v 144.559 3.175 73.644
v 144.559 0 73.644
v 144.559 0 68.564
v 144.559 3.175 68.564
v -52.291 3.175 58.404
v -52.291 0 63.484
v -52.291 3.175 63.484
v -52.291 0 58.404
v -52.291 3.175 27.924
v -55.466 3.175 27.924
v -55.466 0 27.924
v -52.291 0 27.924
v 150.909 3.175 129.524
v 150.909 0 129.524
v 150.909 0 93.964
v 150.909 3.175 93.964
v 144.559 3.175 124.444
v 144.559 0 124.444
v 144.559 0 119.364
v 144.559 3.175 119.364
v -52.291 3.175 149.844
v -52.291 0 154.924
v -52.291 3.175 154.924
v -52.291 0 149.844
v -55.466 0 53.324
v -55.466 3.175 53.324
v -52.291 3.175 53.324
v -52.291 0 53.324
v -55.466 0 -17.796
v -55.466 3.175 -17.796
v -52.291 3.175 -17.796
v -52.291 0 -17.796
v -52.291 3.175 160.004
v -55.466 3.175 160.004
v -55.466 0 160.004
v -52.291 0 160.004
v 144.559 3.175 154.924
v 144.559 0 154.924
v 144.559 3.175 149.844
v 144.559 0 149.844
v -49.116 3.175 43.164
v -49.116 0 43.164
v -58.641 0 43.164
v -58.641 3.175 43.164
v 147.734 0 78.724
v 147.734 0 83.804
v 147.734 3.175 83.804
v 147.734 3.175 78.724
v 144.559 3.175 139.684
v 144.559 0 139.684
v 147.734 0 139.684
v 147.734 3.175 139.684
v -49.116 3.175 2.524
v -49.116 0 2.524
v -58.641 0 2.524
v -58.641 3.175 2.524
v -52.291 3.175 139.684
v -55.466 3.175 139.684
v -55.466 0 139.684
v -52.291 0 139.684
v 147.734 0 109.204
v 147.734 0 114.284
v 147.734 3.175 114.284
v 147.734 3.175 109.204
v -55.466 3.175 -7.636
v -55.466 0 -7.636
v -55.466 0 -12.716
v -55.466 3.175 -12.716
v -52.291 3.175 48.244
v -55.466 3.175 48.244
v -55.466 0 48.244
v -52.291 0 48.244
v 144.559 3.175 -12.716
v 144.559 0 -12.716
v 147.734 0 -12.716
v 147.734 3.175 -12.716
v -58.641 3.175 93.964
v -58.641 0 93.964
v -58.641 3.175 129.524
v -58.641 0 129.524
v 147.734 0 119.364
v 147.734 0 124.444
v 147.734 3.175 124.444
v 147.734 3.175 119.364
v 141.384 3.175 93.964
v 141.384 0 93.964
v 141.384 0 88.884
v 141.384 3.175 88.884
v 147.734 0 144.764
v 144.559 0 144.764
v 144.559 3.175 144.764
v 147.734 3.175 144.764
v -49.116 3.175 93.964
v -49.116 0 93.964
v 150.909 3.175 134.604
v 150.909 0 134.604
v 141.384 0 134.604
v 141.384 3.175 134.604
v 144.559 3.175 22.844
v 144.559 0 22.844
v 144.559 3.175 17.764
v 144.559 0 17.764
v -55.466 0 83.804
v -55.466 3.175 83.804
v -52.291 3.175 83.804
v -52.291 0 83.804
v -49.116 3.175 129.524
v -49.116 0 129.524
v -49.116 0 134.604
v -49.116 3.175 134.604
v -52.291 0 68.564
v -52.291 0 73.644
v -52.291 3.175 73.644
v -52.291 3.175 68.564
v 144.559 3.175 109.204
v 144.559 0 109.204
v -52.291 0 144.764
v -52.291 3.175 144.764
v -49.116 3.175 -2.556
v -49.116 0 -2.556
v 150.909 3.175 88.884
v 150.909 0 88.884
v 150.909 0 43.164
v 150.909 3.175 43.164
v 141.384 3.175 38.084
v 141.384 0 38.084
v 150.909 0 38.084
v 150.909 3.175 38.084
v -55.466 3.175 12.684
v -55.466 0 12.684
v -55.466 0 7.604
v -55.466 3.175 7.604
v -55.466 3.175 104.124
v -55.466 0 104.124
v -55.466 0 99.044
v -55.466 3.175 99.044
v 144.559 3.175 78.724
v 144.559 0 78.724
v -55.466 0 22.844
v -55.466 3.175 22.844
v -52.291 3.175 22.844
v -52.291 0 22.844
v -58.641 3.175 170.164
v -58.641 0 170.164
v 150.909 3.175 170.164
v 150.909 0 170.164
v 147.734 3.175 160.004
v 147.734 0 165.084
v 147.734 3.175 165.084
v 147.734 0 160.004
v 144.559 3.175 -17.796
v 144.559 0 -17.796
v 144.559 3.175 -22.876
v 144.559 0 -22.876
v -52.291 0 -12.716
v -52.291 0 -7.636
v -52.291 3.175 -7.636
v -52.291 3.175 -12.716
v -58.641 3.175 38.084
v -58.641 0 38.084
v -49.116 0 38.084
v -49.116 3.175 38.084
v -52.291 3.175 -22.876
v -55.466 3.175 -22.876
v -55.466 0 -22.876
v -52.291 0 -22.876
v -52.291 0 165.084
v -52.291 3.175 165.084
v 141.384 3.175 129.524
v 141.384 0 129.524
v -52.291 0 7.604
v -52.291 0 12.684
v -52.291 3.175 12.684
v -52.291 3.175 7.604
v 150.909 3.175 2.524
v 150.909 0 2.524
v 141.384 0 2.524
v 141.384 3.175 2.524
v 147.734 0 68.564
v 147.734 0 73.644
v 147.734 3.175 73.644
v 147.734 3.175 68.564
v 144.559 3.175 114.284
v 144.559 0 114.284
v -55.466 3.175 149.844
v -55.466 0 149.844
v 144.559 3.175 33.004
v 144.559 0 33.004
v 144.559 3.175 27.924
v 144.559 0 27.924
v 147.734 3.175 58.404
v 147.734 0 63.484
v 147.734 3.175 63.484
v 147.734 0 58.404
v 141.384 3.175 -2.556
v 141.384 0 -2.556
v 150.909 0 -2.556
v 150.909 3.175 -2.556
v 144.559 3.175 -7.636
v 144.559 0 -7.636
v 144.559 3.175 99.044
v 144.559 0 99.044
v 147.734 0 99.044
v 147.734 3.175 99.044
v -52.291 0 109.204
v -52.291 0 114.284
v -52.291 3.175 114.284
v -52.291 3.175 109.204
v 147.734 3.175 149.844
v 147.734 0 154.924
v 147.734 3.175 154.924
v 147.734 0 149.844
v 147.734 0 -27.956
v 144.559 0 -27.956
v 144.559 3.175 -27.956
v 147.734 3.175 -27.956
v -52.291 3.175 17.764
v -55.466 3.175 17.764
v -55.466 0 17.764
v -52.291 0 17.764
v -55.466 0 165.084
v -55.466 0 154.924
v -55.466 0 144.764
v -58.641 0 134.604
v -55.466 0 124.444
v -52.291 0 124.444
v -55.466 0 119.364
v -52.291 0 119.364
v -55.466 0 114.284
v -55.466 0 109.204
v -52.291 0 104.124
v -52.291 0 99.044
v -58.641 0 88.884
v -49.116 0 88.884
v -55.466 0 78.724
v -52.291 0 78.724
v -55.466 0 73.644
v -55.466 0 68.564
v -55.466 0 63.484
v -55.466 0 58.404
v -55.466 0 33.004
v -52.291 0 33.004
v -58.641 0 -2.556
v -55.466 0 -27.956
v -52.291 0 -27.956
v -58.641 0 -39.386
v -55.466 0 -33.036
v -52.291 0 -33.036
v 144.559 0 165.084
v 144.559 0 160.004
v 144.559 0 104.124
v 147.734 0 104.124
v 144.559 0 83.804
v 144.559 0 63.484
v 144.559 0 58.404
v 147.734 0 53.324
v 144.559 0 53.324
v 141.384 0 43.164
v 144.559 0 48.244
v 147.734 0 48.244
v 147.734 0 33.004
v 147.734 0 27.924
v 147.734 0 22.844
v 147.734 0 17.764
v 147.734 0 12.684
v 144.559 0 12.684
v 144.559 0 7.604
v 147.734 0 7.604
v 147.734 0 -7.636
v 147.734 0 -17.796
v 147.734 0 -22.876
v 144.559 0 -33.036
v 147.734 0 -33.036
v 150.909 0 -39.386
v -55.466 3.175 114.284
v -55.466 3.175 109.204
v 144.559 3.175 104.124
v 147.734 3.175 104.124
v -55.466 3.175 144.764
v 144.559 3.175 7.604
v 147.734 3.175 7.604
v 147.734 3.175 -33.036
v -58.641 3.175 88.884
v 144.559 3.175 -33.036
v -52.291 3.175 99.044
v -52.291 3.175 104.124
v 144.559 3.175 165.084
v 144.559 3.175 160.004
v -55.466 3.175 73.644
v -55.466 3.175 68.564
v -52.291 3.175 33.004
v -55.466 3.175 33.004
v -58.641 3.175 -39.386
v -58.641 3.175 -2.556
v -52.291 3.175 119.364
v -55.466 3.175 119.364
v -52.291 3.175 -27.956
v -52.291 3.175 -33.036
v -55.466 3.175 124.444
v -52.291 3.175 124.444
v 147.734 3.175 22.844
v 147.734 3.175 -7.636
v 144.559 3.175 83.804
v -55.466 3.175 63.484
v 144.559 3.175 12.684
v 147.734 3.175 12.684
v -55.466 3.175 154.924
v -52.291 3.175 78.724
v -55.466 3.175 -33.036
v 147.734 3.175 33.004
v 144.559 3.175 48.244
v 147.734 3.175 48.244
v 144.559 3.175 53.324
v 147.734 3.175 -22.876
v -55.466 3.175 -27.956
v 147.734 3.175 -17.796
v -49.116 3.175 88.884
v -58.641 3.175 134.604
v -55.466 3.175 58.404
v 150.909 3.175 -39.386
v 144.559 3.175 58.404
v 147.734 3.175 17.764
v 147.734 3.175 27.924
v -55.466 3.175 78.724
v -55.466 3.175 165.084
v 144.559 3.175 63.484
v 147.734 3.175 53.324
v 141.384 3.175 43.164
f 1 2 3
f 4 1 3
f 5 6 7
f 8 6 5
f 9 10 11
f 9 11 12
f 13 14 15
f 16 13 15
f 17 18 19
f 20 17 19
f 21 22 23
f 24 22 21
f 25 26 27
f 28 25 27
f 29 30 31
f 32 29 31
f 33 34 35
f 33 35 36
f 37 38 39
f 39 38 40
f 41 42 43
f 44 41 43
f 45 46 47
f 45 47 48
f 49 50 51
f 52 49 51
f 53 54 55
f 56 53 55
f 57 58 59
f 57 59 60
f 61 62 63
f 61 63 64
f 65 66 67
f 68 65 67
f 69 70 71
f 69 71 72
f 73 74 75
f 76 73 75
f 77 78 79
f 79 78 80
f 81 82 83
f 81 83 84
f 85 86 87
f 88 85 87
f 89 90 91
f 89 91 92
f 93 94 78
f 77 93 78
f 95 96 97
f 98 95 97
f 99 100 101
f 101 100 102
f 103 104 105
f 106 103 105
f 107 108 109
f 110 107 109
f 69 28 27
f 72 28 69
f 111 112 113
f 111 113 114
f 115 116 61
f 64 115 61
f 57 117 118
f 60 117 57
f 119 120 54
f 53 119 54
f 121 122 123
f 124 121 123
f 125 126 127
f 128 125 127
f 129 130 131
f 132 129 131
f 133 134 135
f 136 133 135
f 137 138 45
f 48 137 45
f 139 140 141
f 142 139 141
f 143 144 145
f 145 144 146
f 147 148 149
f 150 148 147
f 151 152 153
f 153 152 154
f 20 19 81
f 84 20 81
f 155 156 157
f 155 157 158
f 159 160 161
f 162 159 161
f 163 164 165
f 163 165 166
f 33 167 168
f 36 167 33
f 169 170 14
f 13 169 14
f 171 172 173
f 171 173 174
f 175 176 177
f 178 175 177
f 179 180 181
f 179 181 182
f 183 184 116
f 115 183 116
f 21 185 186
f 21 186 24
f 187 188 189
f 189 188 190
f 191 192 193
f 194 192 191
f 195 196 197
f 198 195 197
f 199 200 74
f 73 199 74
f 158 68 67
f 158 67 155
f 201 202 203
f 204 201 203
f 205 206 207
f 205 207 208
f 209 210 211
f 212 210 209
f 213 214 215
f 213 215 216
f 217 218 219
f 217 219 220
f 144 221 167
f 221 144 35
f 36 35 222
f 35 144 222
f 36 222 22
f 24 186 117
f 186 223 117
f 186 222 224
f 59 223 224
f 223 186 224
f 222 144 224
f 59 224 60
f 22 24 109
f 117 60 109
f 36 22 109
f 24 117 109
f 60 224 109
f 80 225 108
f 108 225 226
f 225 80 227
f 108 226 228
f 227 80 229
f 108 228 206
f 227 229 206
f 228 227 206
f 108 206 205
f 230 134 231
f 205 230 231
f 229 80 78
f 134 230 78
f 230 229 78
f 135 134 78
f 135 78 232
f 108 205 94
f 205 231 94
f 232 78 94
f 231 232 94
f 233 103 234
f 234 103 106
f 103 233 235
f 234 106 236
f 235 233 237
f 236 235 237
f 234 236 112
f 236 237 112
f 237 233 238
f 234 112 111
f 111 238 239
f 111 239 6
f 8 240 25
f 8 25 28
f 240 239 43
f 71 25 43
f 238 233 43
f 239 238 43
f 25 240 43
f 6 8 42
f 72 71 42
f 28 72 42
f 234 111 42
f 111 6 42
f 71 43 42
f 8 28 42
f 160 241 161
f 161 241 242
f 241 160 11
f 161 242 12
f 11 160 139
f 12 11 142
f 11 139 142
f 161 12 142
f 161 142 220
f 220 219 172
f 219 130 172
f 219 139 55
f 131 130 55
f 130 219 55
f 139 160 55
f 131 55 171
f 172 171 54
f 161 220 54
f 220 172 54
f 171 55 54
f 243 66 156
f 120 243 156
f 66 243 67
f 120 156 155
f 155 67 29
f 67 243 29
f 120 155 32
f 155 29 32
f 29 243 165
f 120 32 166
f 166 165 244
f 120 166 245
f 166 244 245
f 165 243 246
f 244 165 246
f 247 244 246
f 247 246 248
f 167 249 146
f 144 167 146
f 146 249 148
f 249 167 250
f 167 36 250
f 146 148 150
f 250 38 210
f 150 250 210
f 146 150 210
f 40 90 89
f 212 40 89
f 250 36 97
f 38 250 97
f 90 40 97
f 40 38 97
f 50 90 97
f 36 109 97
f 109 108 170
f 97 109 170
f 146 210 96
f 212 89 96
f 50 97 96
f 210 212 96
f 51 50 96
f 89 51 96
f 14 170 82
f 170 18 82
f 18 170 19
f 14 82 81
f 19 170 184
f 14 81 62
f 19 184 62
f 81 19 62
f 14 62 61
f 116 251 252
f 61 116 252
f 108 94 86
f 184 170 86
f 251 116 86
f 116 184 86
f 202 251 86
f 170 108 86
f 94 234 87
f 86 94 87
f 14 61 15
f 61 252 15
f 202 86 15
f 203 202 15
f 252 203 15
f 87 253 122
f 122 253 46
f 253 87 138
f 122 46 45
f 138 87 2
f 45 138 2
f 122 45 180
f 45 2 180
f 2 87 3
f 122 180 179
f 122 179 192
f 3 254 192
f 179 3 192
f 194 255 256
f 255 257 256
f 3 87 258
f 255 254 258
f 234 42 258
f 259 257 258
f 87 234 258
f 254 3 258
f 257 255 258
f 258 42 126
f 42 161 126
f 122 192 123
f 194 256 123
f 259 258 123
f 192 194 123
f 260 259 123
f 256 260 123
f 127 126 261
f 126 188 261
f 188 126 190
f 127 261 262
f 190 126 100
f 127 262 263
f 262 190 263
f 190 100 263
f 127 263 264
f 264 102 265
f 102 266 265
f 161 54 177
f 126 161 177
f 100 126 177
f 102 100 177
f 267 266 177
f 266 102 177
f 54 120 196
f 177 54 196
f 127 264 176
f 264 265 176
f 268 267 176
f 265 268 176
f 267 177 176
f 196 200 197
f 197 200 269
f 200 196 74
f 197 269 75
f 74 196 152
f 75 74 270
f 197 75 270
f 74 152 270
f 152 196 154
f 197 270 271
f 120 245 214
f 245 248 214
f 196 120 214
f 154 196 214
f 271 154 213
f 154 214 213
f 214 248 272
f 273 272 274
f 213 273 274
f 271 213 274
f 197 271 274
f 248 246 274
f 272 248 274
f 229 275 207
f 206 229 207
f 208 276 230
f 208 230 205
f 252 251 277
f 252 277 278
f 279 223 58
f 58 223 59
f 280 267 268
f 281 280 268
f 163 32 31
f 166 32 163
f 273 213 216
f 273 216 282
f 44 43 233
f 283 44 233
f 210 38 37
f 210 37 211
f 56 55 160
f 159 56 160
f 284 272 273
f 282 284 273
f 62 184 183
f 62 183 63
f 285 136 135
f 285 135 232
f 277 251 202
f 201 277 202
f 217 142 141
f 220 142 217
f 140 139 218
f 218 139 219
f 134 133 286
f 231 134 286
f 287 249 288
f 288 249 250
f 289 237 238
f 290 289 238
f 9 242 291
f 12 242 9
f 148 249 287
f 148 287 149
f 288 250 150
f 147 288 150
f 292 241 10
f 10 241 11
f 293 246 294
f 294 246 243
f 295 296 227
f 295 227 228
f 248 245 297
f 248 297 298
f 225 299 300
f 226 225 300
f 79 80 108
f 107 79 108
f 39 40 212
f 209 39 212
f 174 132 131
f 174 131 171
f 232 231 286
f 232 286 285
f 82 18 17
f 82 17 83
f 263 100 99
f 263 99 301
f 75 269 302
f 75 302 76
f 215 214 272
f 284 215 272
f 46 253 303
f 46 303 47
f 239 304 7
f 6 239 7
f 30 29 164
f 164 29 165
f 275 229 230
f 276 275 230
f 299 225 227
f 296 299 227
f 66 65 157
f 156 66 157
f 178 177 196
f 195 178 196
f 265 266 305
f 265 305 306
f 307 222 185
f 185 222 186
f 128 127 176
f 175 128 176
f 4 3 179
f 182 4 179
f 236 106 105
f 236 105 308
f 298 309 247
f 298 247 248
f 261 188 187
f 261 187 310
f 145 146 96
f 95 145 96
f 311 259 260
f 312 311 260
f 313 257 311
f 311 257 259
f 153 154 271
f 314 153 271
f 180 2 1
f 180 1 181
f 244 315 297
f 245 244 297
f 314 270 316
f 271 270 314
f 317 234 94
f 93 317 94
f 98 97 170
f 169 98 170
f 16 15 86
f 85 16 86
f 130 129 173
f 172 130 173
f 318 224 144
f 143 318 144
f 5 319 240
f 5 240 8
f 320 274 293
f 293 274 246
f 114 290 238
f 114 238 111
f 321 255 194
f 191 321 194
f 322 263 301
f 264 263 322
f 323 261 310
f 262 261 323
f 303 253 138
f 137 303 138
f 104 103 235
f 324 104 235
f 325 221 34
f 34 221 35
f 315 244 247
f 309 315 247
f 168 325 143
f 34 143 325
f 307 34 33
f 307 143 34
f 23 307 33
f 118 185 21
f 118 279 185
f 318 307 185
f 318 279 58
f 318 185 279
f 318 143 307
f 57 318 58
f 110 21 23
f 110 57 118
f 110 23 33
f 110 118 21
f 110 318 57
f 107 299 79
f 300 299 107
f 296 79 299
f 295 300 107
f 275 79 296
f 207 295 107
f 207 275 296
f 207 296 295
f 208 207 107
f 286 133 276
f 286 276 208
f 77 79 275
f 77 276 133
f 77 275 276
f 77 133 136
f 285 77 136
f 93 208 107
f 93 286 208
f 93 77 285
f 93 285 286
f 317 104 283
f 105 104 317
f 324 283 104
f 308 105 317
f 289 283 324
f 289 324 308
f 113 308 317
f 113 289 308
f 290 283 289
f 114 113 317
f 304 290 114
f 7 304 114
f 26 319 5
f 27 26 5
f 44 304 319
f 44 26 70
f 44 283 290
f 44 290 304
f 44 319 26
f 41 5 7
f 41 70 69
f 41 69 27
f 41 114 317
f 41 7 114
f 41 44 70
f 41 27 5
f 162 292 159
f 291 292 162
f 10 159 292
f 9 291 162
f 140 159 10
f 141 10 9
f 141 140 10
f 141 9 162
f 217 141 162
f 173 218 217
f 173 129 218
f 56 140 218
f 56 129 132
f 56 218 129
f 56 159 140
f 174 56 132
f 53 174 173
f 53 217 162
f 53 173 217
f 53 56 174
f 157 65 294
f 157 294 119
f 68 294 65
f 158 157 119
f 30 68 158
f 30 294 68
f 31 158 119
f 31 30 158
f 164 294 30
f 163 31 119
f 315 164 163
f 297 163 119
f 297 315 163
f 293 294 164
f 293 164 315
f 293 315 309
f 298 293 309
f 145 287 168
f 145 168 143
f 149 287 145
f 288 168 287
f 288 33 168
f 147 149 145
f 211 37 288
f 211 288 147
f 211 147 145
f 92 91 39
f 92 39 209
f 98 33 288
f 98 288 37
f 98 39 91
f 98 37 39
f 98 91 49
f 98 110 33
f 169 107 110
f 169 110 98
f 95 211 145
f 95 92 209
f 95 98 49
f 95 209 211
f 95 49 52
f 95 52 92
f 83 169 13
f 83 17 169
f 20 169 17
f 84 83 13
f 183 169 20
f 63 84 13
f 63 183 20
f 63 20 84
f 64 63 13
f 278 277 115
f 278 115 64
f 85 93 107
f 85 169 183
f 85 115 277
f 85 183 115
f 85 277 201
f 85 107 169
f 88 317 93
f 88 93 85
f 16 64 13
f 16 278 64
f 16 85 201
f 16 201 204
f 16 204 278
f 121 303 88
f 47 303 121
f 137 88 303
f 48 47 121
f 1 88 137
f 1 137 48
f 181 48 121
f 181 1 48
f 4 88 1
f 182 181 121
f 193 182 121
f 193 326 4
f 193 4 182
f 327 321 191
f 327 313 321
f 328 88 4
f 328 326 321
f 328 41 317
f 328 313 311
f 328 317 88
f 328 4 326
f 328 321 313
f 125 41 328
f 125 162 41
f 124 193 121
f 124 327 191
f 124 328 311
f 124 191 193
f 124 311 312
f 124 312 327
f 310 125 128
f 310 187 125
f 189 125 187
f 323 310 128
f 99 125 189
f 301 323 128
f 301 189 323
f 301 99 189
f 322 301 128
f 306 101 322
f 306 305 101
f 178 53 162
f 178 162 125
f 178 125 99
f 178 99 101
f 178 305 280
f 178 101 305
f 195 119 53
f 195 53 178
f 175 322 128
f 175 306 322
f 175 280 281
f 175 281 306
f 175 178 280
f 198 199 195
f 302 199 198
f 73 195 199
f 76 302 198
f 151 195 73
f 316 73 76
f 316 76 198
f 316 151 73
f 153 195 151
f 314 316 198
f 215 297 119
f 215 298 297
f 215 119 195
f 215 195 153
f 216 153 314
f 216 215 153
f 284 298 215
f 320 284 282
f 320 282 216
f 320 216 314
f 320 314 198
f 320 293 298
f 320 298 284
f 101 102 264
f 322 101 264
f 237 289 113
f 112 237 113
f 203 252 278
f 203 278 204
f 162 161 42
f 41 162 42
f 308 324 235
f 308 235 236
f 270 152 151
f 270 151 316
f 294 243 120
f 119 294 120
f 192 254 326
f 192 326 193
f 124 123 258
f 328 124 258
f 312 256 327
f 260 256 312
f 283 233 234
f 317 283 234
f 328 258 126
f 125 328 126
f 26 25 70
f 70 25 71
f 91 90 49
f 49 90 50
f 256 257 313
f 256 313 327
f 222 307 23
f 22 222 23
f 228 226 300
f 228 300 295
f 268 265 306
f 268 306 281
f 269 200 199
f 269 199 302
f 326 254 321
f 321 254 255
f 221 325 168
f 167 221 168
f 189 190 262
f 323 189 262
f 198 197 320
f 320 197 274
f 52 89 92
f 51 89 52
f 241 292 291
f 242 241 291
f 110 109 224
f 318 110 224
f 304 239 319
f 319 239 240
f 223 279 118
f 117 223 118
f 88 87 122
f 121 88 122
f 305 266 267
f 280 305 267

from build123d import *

# Parameters (mm, degrees)
SKETCH2_W           = 3.175
SKETCH2_H           = 5.08
BOSS_EXTRUDE1_DEPTH = 3.175


with BuildPart() as part:
    # Sketch2 → Boss-Extrude1 (new body)
    with BuildSketch(Plane(origin=(0, 0, 0), x_dir=(1, 0, 0), z_dir=(0, 1, 0))):
        Polygon((-58.640729436, -170.164220965), (150.909270564, -170.164220965), (150.909270564, -134.604220965), (141.384270564, -134.604220965), (141.384270564, -129.524220965), (150.909270564, -129.524220965), (150.909270564, -93.964220965), (141.384270564, -93.964220965), (141.384270564, -88.884220965), (150.909270564, -88.884220965), (150.909270564, -43.164220965), (141.384270564, -43.164220965), (141.384270564, -38.084220965), (150.909270564, -38.084220965), (150.909270564, -2.524220965), (141.384270564, -2.524220965), (141.384270564, 2.555779035), (150.909270564, 2.555779035), (150.909270564, 39.385779035), (-58.640729436, 39.385779035), (-58.640729436, 2.555779035), (-49.115729436, 2.555779035), (-49.115729436, -2.524220965), (-58.640729436, -2.524220965), (-58.640729436, -38.084220965), (-49.115729436, -38.084220965), (-49.115729436, -43.164220965), (-58.640729436, -43.164220965), (-58.640729436, -88.884220965), (-49.115729436, -88.884220965), (-49.115729436, -93.964220965), (-58.640729436, -93.964220965), (-58.640729436, -129.524220965), (-49.115729436, -129.524220965), (-49.115729436, -134.604220965), (-58.640729436, -134.604220965), align=None)
        with Locations((-53.878229436, -162.544220965)):
            Rectangle(SKETCH2_W, SKETCH2_H, mode=Mode.SUBTRACT)
        with Locations((146.146770564, -162.544220965)):
            Rectangle(SKETCH2_W, SKETCH2_H, mode=Mode.SUBTRACT)
        with Locations((-53.878229436, -152.384220965)):
            Rectangle(SKETCH2_W, SKETCH2_H, mode=Mode.SUBTRACT)
        with Locations((-53.878229436, -142.224220965)):
            Rectangle(SKETCH2_W, SKETCH2_H, mode=Mode.SUBTRACT)
        with Locations((-53.878229436, -121.904220965)):
            Rectangle(SKETCH2_W, SKETCH2_H, mode=Mode.SUBTRACT)
        with Locations((-53.878229436, -111.744220965)):
            Rectangle(SKETCH2_W, SKETCH2_H, mode=Mode.SUBTRACT)
        with Locations((-53.878229436, -101.584220965)):
            Rectangle(SKETCH2_W, SKETCH2_H, mode=Mode.SUBTRACT)
        with Locations((-53.878229436, -81.264220965)):
            Rectangle(SKETCH2_W, SKETCH2_H, mode=Mode.SUBTRACT)
        with Locations((-53.878229436, -71.104220965)):
            Rectangle(SKETCH2_W, SKETCH2_H, mode=Mode.SUBTRACT)
        with Locations((-53.878229436, -60.944220965)):
            Rectangle(SKETCH2_W, SKETCH2_H, mode=Mode.SUBTRACT)
        with Locations((-53.878229436, -50.784220965)):
            Rectangle(SKETCH2_W, SKETCH2_H, mode=Mode.SUBTRACT)
        with Locations((-53.878229436, -30.464220965)):
            Rectangle(SKETCH2_W, SKETCH2_H, mode=Mode.SUBTRACT)
        with Locations((-53.878229436, -20.304220965)):
            Rectangle(SKETCH2_W, SKETCH2_H, mode=Mode.SUBTRACT)
        with Locations((-53.878229436, -10.144220965)):
            Rectangle(SKETCH2_W, SKETCH2_H, mode=Mode.SUBTRACT)
        with Locations((-53.878229436, 10.175779035)):
            Rectangle(SKETCH2_W, SKETCH2_H, mode=Mode.SUBTRACT)
        with Locations((-53.878229436, 20.335779035)):
            Rectangle(SKETCH2_W, SKETCH2_H, mode=Mode.SUBTRACT)
        with Locations((-53.878229436, 30.495779035)):
            Rectangle(SKETCH2_W, SKETCH2_H, mode=Mode.SUBTRACT)
        with Locations((146.146770564, 30.495779035)):
            Rectangle(SKETCH2_W, SKETCH2_H, mode=Mode.SUBTRACT)
        with Locations((146.146770564, 20.335779035)):
            Rectangle(SKETCH2_W, SKETCH2_H, mode=Mode.SUBTRACT)
        with Locations((146.146770564, 10.175779035)):
            Rectangle(SKETCH2_W, SKETCH2_H, mode=Mode.SUBTRACT)
        with Locations((146.146770564, -10.144220965)):
            Rectangle(SKETCH2_W, SKETCH2_H, mode=Mode.SUBTRACT)
        with Locations((146.146770564, -20.304220965)):
            Rectangle(SKETCH2_W, SKETCH2_H, mode=Mode.SUBTRACT)
        with Locations((146.146770564, -30.464220965)):
            Rectangle(SKETCH2_W, SKETCH2_H, mode=Mode.SUBTRACT)
        with Locations((146.146770564, -50.784220965)):
            Rectangle(SKETCH2_W, SKETCH2_H, mode=Mode.SUBTRACT)
        with Locations((146.146770564, -60.944220965)):
            Rectangle(SKETCH2_W, SKETCH2_H, mode=Mode.SUBTRACT)
        with Locations((146.146770564, -71.104220965)):
            Rectangle(SKETCH2_W, SKETCH2_H, mode=Mode.SUBTRACT)
        with Locations((146.146770564, -81.264220965)):
            Rectangle(SKETCH2_W, SKETCH2_H, mode=Mode.SUBTRACT)
        with Locations((146.146770564, -101.584220965)):
            Rectangle(SKETCH2_W, SKETCH2_H, mode=Mode.SUBTRACT)
        with Locations((146.146770564, -111.744220965)):
            Rectangle(SKETCH2_W, SKETCH2_H, mode=Mode.SUBTRACT)
        with Locations((146.146770564, -121.904220965)):
            Rectangle(SKETCH2_W, SKETCH2_H, mode=Mode.SUBTRACT)
        with Locations((146.146770564, -142.224220965)):
            Rectangle(SKETCH2_W, SKETCH2_H, mode=Mode.SUBTRACT)
        with Locations((146.146770564, -152.384220965)):
            Rectangle(SKETCH2_W, SKETCH2_H, mode=Mode.SUBTRACT)
    extrude(amount=BOSS_EXTRUDE1_DEPTH)


solid = part.part
